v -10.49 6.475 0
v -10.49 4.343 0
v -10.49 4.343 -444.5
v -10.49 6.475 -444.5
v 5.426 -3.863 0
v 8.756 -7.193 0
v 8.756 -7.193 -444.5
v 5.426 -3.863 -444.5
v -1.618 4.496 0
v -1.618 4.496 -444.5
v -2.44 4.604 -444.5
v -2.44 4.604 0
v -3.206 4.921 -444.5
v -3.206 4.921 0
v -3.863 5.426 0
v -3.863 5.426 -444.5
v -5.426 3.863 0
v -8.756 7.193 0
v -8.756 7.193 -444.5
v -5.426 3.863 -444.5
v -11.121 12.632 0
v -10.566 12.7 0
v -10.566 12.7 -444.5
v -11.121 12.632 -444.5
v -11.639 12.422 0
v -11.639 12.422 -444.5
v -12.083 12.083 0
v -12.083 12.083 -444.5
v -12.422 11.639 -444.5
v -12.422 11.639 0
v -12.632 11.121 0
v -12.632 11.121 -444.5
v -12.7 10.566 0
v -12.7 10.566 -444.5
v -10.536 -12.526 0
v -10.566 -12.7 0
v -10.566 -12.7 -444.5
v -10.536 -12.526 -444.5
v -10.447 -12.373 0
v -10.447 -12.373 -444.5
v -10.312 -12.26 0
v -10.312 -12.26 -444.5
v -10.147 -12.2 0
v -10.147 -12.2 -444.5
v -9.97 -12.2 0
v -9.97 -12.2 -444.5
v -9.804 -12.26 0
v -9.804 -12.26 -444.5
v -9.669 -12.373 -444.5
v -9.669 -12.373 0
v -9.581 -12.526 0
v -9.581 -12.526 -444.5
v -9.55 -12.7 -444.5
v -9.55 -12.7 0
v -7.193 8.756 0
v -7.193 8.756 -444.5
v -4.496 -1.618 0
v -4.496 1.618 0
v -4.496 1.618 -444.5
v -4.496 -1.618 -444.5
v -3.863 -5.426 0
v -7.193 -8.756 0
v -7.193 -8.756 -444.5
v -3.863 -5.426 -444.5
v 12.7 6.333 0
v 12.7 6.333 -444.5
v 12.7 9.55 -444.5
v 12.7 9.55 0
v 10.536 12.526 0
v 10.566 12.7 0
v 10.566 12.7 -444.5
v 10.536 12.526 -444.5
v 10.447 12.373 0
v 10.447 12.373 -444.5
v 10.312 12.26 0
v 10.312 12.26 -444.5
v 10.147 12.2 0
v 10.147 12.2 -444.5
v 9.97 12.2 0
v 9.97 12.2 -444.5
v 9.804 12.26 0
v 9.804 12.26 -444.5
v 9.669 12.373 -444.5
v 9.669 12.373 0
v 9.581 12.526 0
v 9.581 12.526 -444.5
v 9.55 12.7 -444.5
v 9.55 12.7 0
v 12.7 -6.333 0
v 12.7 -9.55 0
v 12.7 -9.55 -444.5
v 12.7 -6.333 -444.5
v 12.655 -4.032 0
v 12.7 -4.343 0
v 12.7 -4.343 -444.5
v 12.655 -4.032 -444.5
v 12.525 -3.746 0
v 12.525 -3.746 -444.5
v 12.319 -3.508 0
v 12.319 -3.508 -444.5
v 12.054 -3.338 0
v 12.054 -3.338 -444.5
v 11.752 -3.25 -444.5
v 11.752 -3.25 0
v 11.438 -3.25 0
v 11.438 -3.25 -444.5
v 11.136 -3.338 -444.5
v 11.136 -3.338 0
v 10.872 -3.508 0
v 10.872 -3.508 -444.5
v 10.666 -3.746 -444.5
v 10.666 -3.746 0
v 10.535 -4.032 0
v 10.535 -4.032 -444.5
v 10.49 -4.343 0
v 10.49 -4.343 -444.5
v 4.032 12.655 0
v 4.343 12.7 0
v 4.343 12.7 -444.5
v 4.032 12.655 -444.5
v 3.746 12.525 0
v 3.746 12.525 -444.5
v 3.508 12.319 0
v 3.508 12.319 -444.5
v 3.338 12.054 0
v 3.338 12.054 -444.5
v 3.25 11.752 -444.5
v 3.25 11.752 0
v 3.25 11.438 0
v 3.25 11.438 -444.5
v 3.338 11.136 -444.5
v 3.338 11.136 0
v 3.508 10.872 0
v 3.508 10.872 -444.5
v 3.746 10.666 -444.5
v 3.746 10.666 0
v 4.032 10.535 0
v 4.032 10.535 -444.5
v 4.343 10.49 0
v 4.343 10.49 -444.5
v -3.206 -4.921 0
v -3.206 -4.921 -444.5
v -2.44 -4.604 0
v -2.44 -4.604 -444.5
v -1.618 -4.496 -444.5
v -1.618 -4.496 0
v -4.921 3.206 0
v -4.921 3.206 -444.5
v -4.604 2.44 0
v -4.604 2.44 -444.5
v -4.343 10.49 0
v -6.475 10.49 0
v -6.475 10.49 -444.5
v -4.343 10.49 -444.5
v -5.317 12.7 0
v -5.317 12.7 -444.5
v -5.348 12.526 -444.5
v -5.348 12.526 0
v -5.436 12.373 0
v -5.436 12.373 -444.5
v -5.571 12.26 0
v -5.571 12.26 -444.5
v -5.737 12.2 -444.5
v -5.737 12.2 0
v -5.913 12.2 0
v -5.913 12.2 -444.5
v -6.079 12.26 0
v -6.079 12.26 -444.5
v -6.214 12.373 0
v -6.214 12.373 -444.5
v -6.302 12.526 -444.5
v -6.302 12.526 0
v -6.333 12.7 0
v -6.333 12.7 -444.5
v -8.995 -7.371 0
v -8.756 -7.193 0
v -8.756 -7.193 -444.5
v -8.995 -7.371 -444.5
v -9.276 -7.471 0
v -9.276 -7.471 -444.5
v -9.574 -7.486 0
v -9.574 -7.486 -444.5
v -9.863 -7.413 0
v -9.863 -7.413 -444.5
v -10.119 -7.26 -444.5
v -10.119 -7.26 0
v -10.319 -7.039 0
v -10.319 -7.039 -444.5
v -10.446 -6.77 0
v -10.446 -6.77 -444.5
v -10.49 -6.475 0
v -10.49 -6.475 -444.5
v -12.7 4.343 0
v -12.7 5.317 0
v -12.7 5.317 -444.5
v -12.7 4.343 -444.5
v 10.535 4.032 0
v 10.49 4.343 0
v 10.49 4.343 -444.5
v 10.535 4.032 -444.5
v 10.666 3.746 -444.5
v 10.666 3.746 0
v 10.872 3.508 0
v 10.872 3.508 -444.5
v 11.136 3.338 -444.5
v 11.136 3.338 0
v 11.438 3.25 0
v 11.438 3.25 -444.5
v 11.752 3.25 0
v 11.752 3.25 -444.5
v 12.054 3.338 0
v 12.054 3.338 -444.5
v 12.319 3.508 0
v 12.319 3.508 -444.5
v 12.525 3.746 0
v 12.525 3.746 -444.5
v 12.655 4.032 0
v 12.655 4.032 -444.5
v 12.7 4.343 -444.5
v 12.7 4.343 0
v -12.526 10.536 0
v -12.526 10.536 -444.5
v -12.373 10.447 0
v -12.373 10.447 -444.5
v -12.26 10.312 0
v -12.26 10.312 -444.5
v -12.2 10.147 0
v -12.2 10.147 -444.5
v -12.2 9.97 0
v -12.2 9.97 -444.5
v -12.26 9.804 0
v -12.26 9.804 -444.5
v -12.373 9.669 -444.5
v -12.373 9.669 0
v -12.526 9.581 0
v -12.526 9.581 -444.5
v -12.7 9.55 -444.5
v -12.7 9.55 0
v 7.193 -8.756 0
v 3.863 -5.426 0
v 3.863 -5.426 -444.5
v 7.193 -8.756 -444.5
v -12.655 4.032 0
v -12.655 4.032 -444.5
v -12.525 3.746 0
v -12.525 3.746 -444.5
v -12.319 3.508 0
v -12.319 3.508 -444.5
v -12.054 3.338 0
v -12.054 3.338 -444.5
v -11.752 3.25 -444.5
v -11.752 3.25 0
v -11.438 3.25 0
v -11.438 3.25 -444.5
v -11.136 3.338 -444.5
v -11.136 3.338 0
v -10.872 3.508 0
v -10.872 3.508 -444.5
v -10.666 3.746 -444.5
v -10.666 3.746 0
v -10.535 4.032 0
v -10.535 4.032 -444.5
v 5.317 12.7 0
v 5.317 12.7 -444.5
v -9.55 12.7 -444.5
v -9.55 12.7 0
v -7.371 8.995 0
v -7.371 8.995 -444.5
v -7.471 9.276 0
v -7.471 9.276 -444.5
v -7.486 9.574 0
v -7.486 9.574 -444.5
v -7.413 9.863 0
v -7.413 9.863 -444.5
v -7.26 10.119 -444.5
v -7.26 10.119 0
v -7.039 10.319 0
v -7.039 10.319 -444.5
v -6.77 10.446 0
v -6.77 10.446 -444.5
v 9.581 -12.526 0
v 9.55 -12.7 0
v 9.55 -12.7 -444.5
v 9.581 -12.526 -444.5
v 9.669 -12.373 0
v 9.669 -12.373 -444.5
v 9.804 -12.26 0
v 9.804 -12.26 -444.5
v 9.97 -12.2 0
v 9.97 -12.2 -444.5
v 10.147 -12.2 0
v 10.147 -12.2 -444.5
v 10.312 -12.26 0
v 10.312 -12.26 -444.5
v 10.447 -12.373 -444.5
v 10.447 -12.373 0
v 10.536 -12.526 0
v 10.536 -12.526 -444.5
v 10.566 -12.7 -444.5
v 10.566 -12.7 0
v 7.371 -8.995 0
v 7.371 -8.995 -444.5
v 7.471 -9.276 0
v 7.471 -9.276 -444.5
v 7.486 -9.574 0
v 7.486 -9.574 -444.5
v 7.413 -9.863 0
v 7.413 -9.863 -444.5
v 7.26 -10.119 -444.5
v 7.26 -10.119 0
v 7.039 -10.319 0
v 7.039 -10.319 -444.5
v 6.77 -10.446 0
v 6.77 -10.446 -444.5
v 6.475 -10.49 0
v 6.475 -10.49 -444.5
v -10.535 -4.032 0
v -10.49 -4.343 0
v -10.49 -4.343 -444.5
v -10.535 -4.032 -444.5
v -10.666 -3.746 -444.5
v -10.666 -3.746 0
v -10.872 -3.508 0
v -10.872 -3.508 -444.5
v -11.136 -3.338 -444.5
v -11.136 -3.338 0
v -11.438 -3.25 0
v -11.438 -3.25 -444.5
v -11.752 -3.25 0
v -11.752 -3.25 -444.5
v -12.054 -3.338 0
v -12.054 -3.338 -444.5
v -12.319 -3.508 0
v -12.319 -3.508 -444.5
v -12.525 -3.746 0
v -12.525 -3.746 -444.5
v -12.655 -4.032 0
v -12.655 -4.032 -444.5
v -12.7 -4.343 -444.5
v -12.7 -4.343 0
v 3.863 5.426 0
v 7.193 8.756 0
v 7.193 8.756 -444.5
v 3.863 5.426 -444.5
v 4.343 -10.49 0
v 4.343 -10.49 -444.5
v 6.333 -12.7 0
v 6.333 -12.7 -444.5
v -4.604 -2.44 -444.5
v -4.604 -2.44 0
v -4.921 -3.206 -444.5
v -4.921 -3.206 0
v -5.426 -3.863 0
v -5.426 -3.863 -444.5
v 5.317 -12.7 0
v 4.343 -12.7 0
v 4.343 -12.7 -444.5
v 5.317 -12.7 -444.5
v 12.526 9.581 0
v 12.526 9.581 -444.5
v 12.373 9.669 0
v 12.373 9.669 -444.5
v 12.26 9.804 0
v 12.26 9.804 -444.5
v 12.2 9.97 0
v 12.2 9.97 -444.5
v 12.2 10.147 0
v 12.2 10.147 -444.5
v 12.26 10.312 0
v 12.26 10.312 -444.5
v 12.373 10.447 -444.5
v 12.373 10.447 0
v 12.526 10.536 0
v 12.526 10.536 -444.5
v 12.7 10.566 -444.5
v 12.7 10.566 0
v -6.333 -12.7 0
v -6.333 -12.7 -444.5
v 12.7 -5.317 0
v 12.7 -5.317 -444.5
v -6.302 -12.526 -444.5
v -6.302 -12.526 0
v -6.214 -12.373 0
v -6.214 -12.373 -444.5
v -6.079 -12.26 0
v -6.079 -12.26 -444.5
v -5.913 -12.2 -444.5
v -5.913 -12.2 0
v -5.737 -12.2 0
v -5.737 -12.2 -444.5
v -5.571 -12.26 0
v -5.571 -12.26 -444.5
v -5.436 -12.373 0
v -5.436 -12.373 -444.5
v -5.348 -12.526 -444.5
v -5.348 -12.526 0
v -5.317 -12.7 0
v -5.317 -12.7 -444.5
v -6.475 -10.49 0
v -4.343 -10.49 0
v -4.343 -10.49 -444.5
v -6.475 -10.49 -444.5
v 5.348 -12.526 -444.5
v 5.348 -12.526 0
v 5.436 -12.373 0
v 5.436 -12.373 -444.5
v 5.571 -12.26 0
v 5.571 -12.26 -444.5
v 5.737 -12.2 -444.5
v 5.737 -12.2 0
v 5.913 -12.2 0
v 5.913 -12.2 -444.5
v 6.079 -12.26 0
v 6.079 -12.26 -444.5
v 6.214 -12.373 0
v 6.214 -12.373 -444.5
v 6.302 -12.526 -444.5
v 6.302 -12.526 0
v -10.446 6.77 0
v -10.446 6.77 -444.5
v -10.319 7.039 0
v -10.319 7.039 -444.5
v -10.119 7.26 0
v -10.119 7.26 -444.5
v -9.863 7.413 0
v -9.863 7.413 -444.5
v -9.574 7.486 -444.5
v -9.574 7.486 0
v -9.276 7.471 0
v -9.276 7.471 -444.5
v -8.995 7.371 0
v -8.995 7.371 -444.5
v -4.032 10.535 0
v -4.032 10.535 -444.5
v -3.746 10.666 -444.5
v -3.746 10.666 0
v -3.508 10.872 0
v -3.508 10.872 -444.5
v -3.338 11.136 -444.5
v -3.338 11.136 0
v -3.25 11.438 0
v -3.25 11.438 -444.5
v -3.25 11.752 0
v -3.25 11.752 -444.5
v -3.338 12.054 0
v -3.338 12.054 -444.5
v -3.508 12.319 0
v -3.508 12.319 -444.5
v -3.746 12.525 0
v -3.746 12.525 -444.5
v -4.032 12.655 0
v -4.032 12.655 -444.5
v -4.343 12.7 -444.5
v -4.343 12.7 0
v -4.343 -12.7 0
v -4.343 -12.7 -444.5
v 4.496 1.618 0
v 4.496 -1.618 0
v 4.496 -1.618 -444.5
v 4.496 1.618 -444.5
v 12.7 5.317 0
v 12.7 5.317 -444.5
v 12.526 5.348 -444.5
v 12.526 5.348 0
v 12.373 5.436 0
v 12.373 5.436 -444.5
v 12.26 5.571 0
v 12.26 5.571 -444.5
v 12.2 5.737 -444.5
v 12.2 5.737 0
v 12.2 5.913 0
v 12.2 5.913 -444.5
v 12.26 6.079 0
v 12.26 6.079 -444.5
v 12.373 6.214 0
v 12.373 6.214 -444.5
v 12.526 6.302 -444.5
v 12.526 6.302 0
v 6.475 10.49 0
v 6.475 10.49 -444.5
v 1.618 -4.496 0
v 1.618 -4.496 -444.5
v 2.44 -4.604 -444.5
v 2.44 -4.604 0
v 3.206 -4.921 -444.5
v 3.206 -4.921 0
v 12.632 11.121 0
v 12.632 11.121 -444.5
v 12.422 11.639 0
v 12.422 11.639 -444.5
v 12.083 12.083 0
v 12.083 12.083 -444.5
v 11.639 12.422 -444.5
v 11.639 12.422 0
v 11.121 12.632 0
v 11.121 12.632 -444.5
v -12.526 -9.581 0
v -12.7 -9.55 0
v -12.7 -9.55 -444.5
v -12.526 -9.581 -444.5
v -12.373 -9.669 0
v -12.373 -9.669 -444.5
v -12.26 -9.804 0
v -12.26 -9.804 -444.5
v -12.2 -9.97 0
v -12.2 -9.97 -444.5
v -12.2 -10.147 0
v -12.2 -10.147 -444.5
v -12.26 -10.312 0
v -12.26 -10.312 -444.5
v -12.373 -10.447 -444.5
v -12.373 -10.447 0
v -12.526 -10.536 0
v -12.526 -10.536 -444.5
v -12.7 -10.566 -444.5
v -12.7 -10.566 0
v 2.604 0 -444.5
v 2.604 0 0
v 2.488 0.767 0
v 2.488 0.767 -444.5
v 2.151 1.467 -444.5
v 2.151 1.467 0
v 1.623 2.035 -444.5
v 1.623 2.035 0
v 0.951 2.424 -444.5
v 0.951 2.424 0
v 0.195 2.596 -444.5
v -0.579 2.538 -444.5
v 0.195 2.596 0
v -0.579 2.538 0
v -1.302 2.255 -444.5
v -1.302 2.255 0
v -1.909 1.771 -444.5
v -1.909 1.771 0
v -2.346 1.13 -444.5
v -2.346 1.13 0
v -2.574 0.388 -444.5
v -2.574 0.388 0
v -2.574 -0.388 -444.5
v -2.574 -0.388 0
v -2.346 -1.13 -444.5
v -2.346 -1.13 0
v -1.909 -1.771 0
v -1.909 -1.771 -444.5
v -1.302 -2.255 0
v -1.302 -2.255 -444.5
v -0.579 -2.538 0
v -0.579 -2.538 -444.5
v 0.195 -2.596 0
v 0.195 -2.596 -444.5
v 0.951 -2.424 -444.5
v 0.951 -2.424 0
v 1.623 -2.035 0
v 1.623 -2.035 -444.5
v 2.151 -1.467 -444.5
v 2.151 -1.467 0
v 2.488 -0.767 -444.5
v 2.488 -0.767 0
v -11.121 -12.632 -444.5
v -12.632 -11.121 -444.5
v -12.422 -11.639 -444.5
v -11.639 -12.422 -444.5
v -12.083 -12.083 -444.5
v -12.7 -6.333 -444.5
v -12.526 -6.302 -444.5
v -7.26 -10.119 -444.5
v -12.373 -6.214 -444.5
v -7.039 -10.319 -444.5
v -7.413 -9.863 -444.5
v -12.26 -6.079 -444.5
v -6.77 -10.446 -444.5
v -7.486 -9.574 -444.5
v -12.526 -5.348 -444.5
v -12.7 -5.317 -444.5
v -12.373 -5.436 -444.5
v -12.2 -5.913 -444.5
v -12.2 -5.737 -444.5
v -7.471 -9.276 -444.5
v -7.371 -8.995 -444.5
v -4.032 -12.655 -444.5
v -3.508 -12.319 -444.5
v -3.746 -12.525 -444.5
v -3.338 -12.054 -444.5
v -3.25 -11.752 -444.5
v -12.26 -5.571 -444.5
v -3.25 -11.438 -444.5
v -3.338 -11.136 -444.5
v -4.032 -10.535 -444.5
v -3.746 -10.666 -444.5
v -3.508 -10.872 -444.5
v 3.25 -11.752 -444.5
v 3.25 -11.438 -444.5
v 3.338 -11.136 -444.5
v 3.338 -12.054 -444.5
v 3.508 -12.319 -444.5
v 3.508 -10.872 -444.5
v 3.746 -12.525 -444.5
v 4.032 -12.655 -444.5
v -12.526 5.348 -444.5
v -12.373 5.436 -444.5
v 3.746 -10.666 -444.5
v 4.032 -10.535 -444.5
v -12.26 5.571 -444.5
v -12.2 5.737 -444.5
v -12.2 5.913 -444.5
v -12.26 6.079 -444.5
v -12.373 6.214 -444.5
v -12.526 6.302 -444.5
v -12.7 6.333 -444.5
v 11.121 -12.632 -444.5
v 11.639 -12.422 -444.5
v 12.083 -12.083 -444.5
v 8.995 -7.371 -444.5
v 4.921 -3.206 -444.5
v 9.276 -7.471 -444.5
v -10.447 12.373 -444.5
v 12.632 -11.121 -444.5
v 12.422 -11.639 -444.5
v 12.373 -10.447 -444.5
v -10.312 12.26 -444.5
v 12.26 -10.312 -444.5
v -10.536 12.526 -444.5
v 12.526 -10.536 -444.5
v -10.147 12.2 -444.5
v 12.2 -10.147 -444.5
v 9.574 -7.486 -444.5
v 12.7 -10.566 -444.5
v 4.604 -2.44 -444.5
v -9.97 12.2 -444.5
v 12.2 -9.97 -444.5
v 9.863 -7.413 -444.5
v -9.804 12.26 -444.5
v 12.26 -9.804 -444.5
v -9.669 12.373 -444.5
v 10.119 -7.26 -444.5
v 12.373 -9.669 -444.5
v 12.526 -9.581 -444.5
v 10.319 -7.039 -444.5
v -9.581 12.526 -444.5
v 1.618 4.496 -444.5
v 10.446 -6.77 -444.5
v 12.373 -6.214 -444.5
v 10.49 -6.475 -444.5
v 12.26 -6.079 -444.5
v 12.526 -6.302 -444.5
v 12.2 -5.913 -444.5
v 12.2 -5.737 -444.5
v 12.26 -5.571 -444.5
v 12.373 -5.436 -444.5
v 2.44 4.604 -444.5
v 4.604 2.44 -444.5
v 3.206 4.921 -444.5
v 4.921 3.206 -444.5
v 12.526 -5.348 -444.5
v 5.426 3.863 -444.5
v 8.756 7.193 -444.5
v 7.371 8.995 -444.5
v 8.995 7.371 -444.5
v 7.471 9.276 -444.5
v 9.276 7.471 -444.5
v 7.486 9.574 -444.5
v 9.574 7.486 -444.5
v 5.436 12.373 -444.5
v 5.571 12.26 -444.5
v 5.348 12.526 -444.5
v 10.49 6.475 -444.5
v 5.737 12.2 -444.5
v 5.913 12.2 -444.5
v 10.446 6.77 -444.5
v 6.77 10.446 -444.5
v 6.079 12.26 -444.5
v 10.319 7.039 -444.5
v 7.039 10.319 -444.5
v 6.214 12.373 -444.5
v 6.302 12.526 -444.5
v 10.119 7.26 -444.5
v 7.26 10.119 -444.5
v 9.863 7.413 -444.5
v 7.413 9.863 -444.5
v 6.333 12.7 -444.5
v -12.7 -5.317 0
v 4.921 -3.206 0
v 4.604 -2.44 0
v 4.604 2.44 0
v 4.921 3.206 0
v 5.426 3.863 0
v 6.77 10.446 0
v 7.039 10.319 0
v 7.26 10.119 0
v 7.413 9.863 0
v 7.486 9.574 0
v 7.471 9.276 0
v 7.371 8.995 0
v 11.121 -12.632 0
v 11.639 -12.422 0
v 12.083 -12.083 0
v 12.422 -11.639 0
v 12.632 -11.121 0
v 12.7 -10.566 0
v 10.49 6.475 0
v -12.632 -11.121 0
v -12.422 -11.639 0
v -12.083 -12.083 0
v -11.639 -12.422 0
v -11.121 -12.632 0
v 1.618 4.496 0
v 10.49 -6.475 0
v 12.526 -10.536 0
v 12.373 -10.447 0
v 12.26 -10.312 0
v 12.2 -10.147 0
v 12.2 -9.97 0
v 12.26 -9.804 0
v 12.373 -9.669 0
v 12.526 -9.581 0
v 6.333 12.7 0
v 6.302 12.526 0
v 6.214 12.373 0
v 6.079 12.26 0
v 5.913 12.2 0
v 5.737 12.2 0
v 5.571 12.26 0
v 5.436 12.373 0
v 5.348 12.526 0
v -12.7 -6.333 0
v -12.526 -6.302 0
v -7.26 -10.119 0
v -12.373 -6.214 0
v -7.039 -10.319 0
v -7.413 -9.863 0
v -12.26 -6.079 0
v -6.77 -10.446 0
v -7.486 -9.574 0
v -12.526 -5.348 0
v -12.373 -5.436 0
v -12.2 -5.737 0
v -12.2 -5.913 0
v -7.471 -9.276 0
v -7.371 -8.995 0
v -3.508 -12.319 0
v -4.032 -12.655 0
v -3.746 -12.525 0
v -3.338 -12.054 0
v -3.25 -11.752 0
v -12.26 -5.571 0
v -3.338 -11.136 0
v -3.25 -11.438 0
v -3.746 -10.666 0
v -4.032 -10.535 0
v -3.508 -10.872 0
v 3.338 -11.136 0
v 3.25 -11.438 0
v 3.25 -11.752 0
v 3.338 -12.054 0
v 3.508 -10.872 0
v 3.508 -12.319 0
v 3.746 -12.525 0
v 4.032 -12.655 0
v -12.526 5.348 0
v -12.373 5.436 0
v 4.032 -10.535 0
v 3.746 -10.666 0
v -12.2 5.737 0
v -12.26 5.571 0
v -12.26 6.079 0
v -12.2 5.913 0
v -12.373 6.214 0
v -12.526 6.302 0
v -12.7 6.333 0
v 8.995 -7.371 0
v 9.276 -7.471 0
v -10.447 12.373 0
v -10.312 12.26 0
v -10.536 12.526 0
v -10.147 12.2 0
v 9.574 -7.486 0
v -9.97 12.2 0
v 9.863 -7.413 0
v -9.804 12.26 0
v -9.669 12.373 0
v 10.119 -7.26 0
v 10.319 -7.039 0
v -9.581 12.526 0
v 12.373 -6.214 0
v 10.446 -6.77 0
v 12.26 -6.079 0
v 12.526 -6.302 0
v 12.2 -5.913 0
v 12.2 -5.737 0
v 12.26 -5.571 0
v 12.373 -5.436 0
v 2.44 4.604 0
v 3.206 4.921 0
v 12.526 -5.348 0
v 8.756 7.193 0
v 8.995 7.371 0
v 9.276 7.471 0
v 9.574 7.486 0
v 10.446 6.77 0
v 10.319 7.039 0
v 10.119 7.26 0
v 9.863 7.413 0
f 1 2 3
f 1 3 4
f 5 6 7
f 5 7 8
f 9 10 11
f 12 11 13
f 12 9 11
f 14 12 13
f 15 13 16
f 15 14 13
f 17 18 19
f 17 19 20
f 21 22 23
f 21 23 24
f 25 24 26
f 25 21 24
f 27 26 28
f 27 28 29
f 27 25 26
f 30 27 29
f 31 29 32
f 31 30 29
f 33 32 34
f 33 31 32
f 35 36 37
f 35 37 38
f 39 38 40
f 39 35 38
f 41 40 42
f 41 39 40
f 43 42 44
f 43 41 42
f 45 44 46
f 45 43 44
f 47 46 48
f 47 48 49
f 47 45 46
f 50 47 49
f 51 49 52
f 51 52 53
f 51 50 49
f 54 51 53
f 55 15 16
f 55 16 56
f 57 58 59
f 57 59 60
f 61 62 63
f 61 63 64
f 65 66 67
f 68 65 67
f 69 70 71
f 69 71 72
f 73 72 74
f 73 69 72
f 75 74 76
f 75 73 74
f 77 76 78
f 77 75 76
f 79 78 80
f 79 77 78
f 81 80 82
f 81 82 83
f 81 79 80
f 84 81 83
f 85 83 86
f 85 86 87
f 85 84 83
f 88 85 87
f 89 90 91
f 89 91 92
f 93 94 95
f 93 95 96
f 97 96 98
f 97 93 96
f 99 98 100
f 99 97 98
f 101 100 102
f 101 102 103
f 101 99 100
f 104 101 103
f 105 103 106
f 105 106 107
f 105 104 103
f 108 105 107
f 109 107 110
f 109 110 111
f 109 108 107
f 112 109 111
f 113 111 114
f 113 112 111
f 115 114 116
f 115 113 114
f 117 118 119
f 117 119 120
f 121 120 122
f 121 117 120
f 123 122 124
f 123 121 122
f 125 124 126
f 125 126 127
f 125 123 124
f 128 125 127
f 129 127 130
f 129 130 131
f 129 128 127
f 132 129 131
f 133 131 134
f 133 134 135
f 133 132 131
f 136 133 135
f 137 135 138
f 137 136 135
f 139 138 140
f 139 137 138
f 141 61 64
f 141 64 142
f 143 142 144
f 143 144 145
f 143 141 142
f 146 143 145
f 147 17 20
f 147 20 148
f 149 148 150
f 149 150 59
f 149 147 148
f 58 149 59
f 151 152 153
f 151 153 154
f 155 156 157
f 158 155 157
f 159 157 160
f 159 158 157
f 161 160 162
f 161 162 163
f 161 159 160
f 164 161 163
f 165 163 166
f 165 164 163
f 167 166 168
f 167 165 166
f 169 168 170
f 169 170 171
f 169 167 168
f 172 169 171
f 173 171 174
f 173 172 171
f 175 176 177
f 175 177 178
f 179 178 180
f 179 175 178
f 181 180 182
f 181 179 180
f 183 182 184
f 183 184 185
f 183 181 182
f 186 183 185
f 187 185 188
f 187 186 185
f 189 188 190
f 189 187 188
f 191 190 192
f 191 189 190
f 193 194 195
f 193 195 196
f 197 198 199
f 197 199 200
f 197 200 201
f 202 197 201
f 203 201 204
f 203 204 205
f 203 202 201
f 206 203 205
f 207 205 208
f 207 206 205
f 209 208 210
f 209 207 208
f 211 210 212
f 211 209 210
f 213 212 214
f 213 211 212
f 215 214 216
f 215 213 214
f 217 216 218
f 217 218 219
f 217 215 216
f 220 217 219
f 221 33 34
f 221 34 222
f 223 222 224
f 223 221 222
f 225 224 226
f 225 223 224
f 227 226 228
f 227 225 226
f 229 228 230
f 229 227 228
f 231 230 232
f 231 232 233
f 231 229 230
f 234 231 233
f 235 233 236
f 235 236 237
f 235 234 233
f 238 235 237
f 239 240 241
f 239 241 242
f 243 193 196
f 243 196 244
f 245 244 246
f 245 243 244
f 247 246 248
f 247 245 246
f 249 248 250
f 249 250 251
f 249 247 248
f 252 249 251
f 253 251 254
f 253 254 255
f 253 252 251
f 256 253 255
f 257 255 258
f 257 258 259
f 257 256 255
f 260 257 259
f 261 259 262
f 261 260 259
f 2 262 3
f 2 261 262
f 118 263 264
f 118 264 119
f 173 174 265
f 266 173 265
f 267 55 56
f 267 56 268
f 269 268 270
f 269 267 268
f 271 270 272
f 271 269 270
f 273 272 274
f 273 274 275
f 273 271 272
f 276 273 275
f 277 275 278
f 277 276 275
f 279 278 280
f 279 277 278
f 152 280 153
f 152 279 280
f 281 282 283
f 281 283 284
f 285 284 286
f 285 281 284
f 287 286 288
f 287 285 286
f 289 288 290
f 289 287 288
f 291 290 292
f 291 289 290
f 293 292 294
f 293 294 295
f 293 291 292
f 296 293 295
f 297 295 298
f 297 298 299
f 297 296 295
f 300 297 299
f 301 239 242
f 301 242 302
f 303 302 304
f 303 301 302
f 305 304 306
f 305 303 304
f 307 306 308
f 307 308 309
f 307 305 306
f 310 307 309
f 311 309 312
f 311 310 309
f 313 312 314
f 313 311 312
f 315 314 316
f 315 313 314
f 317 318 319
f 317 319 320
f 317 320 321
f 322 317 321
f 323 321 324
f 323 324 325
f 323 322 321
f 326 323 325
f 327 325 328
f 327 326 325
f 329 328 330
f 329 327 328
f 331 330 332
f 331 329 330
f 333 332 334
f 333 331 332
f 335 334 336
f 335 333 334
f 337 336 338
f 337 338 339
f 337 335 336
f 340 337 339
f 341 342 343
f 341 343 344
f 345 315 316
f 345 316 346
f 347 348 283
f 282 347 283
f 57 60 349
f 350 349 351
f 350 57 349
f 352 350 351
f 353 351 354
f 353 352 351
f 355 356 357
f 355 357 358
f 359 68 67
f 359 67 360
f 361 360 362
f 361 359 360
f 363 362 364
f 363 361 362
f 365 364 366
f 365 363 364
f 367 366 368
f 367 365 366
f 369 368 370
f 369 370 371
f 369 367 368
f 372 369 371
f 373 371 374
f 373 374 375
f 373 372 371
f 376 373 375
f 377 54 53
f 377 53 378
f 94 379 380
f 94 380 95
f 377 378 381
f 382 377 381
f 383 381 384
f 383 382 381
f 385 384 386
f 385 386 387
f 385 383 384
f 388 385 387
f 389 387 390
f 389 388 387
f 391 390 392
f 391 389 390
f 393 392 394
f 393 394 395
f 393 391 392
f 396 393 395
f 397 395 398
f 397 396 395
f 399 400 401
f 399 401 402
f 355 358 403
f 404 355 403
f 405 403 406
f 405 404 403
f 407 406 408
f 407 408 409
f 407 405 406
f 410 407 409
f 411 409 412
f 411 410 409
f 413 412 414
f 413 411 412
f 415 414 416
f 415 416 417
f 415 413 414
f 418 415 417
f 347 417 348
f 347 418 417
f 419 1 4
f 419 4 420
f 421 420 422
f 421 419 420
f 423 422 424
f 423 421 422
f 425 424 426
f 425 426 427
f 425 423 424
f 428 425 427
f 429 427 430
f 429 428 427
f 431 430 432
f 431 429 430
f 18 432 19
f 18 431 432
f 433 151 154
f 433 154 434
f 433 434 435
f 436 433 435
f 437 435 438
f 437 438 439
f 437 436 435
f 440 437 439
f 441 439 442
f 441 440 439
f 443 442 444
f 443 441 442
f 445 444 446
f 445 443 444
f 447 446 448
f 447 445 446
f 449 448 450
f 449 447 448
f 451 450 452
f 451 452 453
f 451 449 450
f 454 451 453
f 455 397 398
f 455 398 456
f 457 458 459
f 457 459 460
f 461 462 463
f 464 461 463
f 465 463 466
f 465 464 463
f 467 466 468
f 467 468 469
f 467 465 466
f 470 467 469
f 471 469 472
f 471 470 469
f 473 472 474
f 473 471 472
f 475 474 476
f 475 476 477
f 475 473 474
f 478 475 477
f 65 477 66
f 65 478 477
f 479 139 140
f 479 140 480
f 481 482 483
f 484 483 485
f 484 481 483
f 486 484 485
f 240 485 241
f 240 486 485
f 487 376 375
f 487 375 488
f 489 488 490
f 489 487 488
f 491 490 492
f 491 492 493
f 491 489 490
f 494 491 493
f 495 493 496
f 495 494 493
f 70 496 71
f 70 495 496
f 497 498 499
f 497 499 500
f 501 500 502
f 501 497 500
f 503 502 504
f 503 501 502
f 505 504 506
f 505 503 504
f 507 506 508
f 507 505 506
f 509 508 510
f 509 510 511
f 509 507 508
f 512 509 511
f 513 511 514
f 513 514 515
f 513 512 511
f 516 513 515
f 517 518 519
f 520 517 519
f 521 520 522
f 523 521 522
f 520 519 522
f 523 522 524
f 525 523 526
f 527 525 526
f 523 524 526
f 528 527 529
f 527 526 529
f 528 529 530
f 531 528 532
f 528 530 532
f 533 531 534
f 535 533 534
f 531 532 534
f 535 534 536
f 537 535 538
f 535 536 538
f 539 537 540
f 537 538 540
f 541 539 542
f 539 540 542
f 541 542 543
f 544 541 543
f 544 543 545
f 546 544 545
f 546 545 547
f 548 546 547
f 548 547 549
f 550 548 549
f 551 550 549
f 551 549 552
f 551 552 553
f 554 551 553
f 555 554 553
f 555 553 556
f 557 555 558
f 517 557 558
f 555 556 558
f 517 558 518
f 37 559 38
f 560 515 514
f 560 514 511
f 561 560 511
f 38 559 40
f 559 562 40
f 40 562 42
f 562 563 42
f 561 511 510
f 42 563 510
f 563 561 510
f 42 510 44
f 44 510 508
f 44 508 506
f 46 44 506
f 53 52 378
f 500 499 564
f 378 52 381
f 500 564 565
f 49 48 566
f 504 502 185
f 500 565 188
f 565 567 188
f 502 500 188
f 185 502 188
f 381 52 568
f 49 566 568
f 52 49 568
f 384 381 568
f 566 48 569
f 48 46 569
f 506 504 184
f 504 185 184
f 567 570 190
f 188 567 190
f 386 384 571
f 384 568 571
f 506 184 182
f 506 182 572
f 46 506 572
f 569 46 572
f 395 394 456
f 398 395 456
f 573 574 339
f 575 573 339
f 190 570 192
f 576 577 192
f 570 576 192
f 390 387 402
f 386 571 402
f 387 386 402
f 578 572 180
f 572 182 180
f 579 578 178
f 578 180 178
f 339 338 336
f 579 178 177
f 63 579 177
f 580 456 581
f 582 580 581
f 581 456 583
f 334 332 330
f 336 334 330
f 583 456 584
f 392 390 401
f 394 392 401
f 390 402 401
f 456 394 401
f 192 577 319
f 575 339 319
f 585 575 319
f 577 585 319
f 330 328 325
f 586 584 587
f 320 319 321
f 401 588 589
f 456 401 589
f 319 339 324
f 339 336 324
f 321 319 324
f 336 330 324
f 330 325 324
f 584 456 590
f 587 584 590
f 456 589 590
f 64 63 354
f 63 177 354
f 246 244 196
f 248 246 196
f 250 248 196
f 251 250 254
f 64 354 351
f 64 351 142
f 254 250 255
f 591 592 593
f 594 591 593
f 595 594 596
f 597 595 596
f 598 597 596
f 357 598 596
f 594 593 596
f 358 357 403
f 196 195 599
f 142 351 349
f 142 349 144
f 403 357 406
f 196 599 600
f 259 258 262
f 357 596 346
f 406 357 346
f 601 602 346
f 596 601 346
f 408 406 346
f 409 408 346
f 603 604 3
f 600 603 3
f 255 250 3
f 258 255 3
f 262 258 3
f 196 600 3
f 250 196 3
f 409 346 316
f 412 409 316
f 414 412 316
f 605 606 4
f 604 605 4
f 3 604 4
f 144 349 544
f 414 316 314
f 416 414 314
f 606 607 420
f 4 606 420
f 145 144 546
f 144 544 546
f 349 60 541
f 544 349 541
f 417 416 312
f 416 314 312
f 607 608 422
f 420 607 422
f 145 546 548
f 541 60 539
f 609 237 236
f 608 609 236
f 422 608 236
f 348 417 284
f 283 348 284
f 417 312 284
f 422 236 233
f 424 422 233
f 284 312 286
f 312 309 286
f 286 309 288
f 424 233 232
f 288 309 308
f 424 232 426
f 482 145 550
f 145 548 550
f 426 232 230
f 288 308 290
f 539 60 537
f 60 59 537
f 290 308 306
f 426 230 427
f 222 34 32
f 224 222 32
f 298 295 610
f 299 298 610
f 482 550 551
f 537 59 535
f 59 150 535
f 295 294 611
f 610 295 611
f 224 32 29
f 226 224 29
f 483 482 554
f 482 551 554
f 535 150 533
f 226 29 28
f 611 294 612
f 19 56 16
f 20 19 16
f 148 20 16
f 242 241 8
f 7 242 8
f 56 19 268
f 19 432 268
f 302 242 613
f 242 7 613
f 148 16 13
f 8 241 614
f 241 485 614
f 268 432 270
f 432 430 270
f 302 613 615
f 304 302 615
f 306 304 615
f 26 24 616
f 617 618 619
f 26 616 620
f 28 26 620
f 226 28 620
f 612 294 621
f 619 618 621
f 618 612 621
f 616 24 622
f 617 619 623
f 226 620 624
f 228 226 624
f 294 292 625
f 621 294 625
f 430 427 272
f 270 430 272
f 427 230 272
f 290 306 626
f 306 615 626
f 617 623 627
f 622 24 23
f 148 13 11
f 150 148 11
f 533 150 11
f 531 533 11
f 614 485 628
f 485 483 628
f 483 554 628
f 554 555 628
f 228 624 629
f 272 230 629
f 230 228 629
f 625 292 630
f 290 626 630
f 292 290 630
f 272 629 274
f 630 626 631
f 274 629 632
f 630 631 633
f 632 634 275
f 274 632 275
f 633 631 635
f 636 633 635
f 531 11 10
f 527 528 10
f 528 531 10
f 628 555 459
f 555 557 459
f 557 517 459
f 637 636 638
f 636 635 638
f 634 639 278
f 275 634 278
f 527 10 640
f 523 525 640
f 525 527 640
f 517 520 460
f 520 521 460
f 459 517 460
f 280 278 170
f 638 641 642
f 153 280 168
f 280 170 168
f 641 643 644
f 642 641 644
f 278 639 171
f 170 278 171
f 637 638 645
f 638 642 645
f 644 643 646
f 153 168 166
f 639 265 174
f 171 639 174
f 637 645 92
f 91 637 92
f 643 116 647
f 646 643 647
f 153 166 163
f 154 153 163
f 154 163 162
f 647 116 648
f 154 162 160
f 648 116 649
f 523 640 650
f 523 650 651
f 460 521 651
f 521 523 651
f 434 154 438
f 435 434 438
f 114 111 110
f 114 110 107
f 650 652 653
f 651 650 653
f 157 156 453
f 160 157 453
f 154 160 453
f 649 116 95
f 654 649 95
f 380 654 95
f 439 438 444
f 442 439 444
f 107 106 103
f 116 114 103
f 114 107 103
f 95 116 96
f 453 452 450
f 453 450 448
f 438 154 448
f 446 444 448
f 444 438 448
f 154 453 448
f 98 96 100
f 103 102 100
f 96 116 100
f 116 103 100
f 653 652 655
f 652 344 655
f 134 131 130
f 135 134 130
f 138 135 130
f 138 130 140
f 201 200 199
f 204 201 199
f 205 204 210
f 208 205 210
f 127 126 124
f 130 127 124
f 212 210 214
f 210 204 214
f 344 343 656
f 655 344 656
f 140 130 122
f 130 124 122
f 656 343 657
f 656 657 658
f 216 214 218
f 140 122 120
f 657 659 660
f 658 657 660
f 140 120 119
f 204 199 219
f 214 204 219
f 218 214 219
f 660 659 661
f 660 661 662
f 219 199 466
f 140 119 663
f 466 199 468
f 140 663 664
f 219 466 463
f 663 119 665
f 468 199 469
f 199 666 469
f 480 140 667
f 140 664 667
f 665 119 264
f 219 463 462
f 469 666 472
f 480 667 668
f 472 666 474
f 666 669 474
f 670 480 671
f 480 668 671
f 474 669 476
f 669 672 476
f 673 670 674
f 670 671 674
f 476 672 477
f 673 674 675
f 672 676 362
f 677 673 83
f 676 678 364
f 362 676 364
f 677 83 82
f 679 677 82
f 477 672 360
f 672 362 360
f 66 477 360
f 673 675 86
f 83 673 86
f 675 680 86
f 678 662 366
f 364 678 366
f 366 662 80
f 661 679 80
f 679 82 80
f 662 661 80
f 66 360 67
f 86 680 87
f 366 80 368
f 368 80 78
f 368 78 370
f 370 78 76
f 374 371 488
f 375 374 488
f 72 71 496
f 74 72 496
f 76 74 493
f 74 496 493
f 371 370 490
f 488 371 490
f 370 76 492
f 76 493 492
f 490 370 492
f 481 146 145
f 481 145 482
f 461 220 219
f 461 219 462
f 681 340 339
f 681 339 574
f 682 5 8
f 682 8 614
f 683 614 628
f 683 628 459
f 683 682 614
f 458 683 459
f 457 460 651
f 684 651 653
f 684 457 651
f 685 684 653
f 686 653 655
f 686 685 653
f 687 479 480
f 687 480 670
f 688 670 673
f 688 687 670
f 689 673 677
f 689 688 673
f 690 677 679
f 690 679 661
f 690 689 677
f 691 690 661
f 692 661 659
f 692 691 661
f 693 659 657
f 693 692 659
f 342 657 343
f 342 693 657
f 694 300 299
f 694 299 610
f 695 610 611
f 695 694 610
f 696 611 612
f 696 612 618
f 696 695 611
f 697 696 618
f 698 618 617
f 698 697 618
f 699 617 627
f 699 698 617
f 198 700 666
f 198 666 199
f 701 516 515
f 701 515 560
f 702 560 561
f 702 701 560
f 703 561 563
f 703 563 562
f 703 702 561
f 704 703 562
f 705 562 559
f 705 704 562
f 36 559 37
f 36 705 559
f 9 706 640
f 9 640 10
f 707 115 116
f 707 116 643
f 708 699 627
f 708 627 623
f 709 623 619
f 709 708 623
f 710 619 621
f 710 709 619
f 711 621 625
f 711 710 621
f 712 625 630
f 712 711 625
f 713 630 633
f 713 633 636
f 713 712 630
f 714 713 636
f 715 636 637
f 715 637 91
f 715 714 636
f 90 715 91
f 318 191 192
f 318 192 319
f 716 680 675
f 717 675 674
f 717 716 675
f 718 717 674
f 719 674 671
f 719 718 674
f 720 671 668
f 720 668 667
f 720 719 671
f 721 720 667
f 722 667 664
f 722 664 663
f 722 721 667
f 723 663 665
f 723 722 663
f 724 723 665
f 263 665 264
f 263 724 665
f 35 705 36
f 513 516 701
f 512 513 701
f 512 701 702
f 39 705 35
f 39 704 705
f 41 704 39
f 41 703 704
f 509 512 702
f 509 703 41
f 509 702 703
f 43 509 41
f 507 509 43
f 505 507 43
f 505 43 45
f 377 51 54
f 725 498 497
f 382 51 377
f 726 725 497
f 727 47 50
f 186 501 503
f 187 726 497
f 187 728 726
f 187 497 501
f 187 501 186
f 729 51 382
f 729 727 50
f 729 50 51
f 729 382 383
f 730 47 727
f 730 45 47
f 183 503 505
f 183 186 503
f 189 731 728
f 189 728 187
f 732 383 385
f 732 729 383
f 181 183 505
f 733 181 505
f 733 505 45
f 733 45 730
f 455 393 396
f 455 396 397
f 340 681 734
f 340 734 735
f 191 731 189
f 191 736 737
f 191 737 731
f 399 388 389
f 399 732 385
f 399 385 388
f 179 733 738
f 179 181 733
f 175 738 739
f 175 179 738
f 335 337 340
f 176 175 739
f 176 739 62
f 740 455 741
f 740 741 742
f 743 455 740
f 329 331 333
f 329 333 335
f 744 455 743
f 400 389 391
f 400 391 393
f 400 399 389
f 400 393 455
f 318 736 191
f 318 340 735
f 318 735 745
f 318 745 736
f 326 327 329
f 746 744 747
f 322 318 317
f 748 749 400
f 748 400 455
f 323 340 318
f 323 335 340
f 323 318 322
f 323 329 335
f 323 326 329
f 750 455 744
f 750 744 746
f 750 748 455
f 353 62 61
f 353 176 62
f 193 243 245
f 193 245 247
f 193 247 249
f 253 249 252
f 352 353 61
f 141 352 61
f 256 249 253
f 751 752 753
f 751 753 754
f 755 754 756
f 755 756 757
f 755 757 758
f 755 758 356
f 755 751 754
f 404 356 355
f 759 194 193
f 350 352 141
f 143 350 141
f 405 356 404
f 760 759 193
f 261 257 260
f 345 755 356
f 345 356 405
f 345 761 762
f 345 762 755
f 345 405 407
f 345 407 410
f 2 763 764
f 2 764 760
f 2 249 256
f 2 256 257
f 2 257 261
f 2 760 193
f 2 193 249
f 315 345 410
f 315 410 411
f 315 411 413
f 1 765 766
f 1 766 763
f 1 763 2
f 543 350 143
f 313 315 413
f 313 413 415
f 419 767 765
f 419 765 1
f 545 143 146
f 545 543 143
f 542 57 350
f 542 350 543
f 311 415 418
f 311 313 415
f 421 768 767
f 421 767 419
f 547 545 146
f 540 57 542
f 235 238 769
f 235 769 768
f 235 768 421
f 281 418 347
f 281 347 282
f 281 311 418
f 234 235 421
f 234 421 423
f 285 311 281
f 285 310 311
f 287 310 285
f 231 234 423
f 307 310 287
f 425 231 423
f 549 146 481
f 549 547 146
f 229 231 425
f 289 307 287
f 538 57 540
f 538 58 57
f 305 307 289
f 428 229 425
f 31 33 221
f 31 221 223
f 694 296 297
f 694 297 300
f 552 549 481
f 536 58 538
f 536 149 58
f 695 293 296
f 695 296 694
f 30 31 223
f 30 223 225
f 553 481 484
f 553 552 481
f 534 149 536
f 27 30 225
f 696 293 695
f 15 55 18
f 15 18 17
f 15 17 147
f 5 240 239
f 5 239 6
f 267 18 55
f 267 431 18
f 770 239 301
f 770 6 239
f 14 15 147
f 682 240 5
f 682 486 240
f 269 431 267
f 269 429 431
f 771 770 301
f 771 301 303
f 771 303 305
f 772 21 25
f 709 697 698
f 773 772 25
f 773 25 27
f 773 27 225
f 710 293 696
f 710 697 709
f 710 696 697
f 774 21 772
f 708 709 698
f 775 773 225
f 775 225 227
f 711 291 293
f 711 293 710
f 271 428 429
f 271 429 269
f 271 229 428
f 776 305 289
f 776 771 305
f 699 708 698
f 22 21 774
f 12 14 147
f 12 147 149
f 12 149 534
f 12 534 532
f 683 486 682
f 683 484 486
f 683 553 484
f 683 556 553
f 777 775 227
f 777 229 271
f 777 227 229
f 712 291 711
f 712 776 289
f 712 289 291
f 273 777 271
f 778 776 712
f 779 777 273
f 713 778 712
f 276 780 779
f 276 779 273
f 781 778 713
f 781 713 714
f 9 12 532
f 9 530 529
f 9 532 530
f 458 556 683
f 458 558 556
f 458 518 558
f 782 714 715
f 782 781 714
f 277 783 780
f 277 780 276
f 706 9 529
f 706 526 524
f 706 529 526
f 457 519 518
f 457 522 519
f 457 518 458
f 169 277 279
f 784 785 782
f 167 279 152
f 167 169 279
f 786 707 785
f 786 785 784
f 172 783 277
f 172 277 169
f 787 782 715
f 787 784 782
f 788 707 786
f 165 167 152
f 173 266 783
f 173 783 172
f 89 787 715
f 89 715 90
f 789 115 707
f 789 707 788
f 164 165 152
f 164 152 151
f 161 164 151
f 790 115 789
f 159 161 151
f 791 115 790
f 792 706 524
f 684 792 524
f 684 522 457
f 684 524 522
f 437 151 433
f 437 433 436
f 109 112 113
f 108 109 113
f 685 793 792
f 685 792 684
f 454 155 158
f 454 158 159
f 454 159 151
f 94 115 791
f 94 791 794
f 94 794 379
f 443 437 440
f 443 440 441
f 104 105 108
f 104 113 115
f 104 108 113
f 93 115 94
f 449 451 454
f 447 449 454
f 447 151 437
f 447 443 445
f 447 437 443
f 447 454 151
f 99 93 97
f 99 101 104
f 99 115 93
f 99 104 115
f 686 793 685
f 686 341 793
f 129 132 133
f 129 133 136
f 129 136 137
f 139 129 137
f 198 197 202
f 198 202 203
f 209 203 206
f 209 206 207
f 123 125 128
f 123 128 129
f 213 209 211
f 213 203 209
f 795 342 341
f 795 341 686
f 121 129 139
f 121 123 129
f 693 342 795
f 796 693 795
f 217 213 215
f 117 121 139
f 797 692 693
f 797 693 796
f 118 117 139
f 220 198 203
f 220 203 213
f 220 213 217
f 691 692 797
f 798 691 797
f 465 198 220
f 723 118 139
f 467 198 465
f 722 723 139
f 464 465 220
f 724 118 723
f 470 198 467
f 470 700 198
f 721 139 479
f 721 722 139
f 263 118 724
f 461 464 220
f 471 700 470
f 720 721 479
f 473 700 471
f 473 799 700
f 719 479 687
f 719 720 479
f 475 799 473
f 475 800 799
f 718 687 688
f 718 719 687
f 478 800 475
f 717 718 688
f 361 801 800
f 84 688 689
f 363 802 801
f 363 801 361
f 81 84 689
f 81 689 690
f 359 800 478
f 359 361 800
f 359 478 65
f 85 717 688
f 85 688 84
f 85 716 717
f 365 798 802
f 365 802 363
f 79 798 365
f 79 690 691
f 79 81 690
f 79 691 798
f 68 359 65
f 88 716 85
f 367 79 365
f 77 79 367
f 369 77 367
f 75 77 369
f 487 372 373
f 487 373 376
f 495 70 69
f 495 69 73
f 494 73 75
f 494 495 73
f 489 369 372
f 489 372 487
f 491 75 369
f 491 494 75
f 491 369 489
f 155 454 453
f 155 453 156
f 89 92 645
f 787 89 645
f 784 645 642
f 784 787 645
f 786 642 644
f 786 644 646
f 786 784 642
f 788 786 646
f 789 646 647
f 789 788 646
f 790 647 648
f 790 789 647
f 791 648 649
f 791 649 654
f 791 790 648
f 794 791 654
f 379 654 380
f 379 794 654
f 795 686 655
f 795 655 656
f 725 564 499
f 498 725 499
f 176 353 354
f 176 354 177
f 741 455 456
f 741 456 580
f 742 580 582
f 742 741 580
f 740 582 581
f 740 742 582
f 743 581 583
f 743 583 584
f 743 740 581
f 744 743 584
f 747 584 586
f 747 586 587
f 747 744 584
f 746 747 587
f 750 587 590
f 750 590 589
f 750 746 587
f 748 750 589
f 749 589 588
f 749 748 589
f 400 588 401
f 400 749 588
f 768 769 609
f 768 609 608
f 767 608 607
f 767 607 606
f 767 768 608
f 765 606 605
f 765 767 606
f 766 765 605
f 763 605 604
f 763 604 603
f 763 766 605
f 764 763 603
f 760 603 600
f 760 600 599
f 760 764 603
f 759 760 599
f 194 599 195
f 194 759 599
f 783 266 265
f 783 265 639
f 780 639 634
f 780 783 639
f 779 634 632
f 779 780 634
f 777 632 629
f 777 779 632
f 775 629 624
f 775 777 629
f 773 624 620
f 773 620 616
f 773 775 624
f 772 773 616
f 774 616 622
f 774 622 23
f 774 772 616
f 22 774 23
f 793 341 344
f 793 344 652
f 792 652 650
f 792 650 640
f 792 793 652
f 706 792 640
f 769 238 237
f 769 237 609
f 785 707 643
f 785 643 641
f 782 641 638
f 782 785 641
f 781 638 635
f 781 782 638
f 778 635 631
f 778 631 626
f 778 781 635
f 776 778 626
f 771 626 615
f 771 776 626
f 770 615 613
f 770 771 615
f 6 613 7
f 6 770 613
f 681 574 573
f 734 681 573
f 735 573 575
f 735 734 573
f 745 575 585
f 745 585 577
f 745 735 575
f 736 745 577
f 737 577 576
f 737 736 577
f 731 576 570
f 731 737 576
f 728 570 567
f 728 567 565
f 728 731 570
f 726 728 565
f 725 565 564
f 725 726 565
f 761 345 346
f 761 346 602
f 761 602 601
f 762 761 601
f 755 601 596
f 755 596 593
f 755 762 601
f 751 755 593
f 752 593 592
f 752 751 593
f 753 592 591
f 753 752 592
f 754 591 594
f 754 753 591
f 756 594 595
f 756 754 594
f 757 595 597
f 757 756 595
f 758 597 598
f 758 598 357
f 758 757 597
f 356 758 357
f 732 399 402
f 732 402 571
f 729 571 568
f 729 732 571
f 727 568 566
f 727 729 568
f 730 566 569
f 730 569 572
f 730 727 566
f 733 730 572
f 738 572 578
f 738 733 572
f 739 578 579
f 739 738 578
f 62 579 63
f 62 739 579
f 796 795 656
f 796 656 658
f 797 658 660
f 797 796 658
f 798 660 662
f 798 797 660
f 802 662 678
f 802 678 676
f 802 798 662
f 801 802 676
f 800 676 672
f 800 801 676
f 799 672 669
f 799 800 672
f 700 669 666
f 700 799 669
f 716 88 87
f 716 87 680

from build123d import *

# Parameters (mm, degrees)
SKETCH1_R           = 2.6035
BOSS_EXTRUDE1_DEPTH = 444.5


with BuildPart() as part:
    # Sketch1 → Boss-Extrude1 (new body)
    with BuildSketch(Plane.XY):
        with BuildLine():
            Line((-12.7, 9.5504), (-12.7, 6.3330836))
            ThreePointArc((-12.7, 6.3330836), (-12.191999975, 5.8250836), (-12.7, 5.3170836))
            Line((-12.7, 5.3170836), (-12.7, 4.3434))
            ThreePointArc((-12.7, 4.3434), (-11.5951, 3.238499971), (-10.4902, 4.3434))
            Line((-10.4902, 4.3434), (-10.4902, 6.474794456))
            ThreePointArc((-10.4902, 6.474794456), (-9.863006367, 7.413456061), (-8.75577951, 7.193214945))
            Line((-8.75577951, 7.193214945), (-5.42573597, 3.863171405))
            ThreePointArc((-5.42573597, 3.863171405), (-4.737482484, 2.833127272), (-4.4958, 1.618107374))
            Line((-4.4958, 1.618107374), (-4.4958, -1.618107374))
            ThreePointArc((-4.4958, -1.618107374), (-4.737482484, -2.833127272), (-5.42573597, -3.863171405))
            Line((-5.42573597, -3.863171405), (-8.75577951, -7.193214945))
            ThreePointArc((-8.75577951, -7.193214945), (-9.863006367, -7.413456061), (-10.4902, -6.474794456))
            Line((-10.4902, -6.474794456), (-10.4902, -4.3434))
            ThreePointArc((-10.4902, -4.3434), (-11.5951, -3.2385), (-12.7, -4.3434))
            Line((-12.7, -4.3434), (-12.7, -5.3170836))
            ThreePointArc((-12.7, -5.3170836), (-12.191999983, -5.8250836), (-12.7, -6.3330836))
            Line((-12.7, -6.3330836), (-12.7, -9.5504))
            ThreePointArc((-12.7, -9.5504), (-12.192000006, -10.058323491), (-12.699846982, -10.566399977))
            ThreePointArc((-12.699846982, -10.566399977), (-12.082522516, -12.082522516), (-10.566399977, -12.699846982))
            ThreePointArc((-10.566399977, -12.699846982), (-10.058323491, -12.192000006), (-9.5504, -12.7))
            Line((-9.5504, -12.7), (-6.3330836, -12.7))
            ThreePointArc((-6.3330836, -12.7), (-5.8250836, -12.191999983), (-5.3170836, -12.7))
            Line((-5.3170836, -12.7), (-4.3434, -12.7))
            ThreePointArc((-4.3434, -12.7), (-3.238499971, -11.5951), (-4.3434, -10.4902))
            Line((-4.3434, -10.4902), (-6.474794456, -10.4902))
            ThreePointArc((-6.474794456, -10.4902), (-7.413456061, -9.863006367), (-7.193214945, -8.75577951))
            Line((-7.193214945, -8.75577951), (-3.863171405, -5.42573597))
            ThreePointArc((-3.863171405, -5.42573597), (-2.833127272, -4.737482484), (-1.618107374, -4.4958))
            Line((-1.618107374, -4.4958), (1.618107374, -4.4958))
            ThreePointArc((1.618107374, -4.4958), (2.833127272, -4.737482484), (3.863171405, -5.42573597))
            Line((3.863171405, -5.42573597), (7.193214945, -8.75577951))
            ThreePointArc((7.193214945, -8.75577951), (7.413456061, -9.863006367), (6.474794456, -10.4902))
            Line((6.474794456, -10.4902), (4.3434, -10.4902))
            ThreePointArc((4.3434, -10.4902), (3.2385, -11.5951), (4.3434, -12.7))
            Line((4.3434, -12.7), (5.3170836, -12.7))
            ThreePointArc((5.3170836, -12.7), (5.8250836, -12.191999983), (6.3330836, -12.7))
            Line((6.3330836, -12.7), (9.5504, -12.7))
            ThreePointArc((9.5504, -12.7), (10.058323491, -12.192000006), (10.566399977, -12.699846982))
            ThreePointArc((10.566399977, -12.699846982), (12.082522516, -12.082522516), (12.699846982, -10.566399977))
            ThreePointArc((12.699846982, -10.566399977), (12.192000006, -10.058323491), (12.7, -9.5504))
            Line((12.7, -9.5504), (12.7, -6.3330836))
            ThreePointArc((12.7, -6.3330836), (12.191999983, -5.8250836), (12.7, -5.3170836))
            Line((12.7, -5.3170836), (12.7, -4.3434))
            ThreePointArc((12.7, -4.3434), (11.5951, -3.238499971), (10.4902, -4.3434))
            Line((10.4902, -4.3434), (10.4902, -6.474794456))
            ThreePointArc((10.4902, -6.474794456), (9.863006367, -7.413456061), (8.75577951, -7.193214945))
            Line((8.75577951, -7.193214945), (5.42573597, -3.863171405))
            ThreePointArc((5.42573597, -3.863171405), (4.737482484, -2.833127272), (4.4958, -1.618107374))
            Line((4.4958, -1.618107374), (4.4958, 1.618107374))
            ThreePointArc((4.4958, 1.618107374), (4.737482484, 2.833127272), (5.42573597, 3.863171405))
            Line((5.42573597, 3.863171405), (8.75577951, 7.193214945))
            ThreePointArc((8.75577951, 7.193214945), (9.863006367, 7.413456061), (10.4902, 6.474794456))
            Line((10.4902, 6.474794456), (10.4902, 4.3434))
            ThreePointArc((10.4902, 4.3434), (11.5951, 3.2385), (12.7, 4.3434))
            Line((12.7, 4.3434), (12.7, 5.3170836))
            ThreePointArc((12.7, 5.3170836), (12.191999983, 5.8250836), (12.7, 6.3330836))
            Line((12.7, 6.3330836), (12.7, 9.5504))
            ThreePointArc((12.7, 9.5504), (12.192000006, 10.058323491), (12.699846982, 10.566399977))
            ThreePointArc((12.699846982, 10.566399977), (12.082522516, 12.082522516), (10.566399977, 12.699846982))
            ThreePointArc((10.566399977, 12.699846982), (10.058323491, 12.192000006), (9.5504, 12.7))
            Line((9.5504, 12.7), (6.3330836, 12.7))
            ThreePointArc((6.3330836, 12.7), (5.8250836, 12.192), (5.3170836, 12.7))
            Line((5.3170836, 12.7), (4.3434, 12.7))
            ThreePointArc((4.3434, 12.7), (3.238499971, 11.5951), (4.3434, 10.4902))
            Line((4.3434, 10.4902), (6.474794456, 10.4902))
            ThreePointArc((6.474794456, 10.4902), (7.413456061, 9.863006367), (7.193214945, 8.75577951))
            Line((7.193214945, 8.75577951), (3.863171405, 5.42573597))
            ThreePointArc((3.863171405, 5.42573597), (2.833127272, 4.737482484), (1.618107374, 4.4958))
            Line((1.618107374, 4.4958), (-1.618107374, 4.4958))
            ThreePointArc((-1.618107374, 4.4958), (-2.833127272, 4.737482484), (-3.863171405, 5.42573597))
            Line((-3.863171405, 5.42573597), (-7.193214945, 8.75577951))
            ThreePointArc((-7.193214945, 8.75577951), (-7.413456061, 9.863006367), (-6.474794456, 10.4902))
            Line((-6.474794456, 10.4902), (-4.3434, 10.4902))
            ThreePointArc((-4.3434, 10.4902), (-3.2385, 11.5951), (-4.3434, 12.7))
            Line((-4.3434, 12.7), (-5.3170836, 12.7))
            ThreePointArc((-5.3170836, 12.7), (-5.8250836, 12.191999983), (-6.3330836, 12.7))
            Line((-6.3330836, 12.7), (-9.5504, 12.7))
            ThreePointArc((-9.5504, 12.7), (-10.058323491, 12.192000006), (-10.566399977, 12.699846982))
            ThreePointArc((-10.566399977, 12.699846982), (-12.082522516, 12.082522516), (-12.699846982, 10.566399977))
            ThreePointArc((-12.699846982, 10.566399977), (-12.192000006, 10.058323491), (-12.7, 9.5504))
        make_face()
        Circle(SKETCH1_R, mode=Mode.SUBTRACT)
    extrude(amount=-BOSS_EXTRUDE1_DEPTH)


solid = part.part
